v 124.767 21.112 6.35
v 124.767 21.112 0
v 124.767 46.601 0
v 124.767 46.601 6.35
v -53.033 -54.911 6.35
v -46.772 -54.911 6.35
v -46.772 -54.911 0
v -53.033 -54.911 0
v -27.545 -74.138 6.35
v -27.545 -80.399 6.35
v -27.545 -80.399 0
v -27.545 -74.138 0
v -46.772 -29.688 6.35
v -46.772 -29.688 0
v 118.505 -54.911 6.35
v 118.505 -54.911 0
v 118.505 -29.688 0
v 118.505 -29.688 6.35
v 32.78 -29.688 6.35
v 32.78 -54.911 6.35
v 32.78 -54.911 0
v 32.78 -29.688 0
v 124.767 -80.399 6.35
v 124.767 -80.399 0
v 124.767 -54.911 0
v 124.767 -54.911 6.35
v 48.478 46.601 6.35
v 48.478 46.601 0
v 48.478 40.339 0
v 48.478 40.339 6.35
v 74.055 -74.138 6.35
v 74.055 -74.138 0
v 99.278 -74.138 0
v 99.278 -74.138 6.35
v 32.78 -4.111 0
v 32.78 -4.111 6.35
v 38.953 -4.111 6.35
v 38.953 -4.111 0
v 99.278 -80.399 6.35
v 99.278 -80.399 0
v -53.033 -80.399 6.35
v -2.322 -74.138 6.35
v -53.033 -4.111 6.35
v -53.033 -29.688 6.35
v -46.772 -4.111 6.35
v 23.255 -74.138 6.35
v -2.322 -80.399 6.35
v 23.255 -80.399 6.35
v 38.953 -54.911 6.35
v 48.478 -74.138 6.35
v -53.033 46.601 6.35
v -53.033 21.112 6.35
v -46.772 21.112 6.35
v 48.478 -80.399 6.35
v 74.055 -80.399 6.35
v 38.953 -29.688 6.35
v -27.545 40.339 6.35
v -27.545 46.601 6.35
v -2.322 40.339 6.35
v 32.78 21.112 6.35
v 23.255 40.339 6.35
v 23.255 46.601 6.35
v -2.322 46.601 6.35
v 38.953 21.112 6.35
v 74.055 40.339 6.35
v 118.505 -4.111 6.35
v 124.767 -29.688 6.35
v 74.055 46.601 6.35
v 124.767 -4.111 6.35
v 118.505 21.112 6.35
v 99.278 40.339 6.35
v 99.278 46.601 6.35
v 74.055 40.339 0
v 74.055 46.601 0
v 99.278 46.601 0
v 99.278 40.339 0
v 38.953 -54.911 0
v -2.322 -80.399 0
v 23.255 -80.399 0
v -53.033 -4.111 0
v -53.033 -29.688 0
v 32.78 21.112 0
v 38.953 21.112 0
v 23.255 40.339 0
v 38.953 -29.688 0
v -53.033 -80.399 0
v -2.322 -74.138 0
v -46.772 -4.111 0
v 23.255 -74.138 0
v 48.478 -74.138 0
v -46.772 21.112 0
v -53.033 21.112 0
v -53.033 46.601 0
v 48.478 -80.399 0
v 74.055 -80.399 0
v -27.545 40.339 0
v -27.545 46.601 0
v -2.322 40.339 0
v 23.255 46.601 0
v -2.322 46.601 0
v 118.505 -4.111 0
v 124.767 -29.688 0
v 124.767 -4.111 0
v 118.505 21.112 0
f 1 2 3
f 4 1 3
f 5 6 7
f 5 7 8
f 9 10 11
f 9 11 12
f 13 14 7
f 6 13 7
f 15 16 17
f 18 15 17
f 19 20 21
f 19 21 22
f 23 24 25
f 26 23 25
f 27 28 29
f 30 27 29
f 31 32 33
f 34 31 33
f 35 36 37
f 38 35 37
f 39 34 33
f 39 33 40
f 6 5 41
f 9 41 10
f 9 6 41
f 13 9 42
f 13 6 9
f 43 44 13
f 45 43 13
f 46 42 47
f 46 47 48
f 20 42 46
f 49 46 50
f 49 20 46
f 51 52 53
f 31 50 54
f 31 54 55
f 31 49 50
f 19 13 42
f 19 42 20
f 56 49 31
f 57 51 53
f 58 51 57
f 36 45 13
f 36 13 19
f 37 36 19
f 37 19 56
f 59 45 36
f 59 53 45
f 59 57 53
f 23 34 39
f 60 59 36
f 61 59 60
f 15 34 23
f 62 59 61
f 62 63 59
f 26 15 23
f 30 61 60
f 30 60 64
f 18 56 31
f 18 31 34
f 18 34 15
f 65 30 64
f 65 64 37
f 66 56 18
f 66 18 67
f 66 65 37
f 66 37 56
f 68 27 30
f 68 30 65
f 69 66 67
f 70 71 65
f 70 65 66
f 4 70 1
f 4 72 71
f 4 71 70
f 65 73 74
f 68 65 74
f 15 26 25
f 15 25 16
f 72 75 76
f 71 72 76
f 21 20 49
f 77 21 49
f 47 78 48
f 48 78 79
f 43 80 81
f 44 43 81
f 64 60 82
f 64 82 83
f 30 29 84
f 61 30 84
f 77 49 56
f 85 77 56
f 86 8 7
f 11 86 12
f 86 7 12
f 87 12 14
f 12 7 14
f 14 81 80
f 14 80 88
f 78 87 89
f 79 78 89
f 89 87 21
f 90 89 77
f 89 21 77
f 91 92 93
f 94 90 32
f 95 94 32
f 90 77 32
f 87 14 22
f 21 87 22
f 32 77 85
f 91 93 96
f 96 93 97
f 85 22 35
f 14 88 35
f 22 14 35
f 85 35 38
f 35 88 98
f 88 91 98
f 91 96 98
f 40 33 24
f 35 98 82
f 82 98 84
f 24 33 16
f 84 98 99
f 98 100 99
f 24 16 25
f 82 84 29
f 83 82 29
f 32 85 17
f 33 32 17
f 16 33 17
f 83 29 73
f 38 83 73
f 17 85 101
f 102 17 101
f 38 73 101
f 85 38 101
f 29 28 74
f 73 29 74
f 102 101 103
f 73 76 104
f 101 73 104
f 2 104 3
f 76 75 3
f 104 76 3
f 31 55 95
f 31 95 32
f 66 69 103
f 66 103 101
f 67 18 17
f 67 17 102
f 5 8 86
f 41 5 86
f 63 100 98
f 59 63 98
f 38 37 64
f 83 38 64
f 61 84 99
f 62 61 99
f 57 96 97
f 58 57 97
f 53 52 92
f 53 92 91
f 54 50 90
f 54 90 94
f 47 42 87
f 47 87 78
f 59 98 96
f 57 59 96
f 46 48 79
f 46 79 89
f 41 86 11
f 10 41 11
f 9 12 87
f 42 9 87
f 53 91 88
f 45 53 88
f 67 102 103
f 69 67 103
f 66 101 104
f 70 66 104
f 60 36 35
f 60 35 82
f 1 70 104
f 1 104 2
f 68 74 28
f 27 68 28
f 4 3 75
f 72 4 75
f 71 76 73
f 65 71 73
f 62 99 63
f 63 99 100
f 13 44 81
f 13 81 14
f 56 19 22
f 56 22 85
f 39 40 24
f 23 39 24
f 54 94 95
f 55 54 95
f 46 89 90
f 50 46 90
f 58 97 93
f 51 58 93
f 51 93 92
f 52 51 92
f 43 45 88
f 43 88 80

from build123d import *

# Parameters (mm, degrees)
F1_DEPTH = 6.35
F2_W     = 6.1722
F2_H     = 25.2222
F3_DEPTH = 25.4


with BuildPart() as f1:
    # F0 (on Top) → F1 (new body)
    with BuildSketch(Plane.XY):
        Polygon((-27.544599, 46.600503), (-53.033499, 46.600503), (-53.033499, 21.111603), (-46.772399, 21.111603), (-46.772399, -4.110597), (-53.033499, -4.110597), (-53.033499, -29.688397), (-46.772399, -29.688397), (-46.772399, -54.910597), (-53.033499, -54.910597), (-53.033499, -80.399497), (-27.544599, -80.399497), (-27.544599, -74.138397), (-2.322399, -74.138397), (-2.322399, -80.399497), (23.255401, -80.399497), (23.255401, -74.138397), (48.477601, -74.138397), (48.477601, -80.399497), (74.055401, -80.399497), (74.055401, -74.138397), (99.277601, -74.138397), (99.277601, -80.399497), (124.766501, -80.399497), (124.766501, -54.910597), (118.505401, -54.910597), (118.505401, -29.688397), (124.766501, -29.688397), (124.766501, -4.110597), (118.505401, -4.110597), (118.505401, 21.111603), (124.766501, 21.111603), (124.766501, 46.600503), (99.277601, 46.600503), (99.277601, 40.339403), (74.055401, 40.339403), (74.055401, 46.600503), (48.477601, 46.600503), (48.477601, 40.339403), (23.255401, 40.339403), (23.255401, 46.600503), (-2.322399, 46.600503), (-2.322399, 40.339403), (-27.544599, 40.339403), align=None)
    extrude(amount=F1_DEPTH)

    # F2 (on face) → F3 (cut)
    with BuildSketch(Plane.XY.offset(6.35)):
        with Locations((35.866501, -42.299497)):
            Rectangle(F2_W, F2_H)
        with Locations((35.866501, 8.500503)):
            Rectangle(F2_W, F2_H)
    extrude(amount=-F3_DEPTH, mode=Mode.SUBTRACT)


solid = f1.part
